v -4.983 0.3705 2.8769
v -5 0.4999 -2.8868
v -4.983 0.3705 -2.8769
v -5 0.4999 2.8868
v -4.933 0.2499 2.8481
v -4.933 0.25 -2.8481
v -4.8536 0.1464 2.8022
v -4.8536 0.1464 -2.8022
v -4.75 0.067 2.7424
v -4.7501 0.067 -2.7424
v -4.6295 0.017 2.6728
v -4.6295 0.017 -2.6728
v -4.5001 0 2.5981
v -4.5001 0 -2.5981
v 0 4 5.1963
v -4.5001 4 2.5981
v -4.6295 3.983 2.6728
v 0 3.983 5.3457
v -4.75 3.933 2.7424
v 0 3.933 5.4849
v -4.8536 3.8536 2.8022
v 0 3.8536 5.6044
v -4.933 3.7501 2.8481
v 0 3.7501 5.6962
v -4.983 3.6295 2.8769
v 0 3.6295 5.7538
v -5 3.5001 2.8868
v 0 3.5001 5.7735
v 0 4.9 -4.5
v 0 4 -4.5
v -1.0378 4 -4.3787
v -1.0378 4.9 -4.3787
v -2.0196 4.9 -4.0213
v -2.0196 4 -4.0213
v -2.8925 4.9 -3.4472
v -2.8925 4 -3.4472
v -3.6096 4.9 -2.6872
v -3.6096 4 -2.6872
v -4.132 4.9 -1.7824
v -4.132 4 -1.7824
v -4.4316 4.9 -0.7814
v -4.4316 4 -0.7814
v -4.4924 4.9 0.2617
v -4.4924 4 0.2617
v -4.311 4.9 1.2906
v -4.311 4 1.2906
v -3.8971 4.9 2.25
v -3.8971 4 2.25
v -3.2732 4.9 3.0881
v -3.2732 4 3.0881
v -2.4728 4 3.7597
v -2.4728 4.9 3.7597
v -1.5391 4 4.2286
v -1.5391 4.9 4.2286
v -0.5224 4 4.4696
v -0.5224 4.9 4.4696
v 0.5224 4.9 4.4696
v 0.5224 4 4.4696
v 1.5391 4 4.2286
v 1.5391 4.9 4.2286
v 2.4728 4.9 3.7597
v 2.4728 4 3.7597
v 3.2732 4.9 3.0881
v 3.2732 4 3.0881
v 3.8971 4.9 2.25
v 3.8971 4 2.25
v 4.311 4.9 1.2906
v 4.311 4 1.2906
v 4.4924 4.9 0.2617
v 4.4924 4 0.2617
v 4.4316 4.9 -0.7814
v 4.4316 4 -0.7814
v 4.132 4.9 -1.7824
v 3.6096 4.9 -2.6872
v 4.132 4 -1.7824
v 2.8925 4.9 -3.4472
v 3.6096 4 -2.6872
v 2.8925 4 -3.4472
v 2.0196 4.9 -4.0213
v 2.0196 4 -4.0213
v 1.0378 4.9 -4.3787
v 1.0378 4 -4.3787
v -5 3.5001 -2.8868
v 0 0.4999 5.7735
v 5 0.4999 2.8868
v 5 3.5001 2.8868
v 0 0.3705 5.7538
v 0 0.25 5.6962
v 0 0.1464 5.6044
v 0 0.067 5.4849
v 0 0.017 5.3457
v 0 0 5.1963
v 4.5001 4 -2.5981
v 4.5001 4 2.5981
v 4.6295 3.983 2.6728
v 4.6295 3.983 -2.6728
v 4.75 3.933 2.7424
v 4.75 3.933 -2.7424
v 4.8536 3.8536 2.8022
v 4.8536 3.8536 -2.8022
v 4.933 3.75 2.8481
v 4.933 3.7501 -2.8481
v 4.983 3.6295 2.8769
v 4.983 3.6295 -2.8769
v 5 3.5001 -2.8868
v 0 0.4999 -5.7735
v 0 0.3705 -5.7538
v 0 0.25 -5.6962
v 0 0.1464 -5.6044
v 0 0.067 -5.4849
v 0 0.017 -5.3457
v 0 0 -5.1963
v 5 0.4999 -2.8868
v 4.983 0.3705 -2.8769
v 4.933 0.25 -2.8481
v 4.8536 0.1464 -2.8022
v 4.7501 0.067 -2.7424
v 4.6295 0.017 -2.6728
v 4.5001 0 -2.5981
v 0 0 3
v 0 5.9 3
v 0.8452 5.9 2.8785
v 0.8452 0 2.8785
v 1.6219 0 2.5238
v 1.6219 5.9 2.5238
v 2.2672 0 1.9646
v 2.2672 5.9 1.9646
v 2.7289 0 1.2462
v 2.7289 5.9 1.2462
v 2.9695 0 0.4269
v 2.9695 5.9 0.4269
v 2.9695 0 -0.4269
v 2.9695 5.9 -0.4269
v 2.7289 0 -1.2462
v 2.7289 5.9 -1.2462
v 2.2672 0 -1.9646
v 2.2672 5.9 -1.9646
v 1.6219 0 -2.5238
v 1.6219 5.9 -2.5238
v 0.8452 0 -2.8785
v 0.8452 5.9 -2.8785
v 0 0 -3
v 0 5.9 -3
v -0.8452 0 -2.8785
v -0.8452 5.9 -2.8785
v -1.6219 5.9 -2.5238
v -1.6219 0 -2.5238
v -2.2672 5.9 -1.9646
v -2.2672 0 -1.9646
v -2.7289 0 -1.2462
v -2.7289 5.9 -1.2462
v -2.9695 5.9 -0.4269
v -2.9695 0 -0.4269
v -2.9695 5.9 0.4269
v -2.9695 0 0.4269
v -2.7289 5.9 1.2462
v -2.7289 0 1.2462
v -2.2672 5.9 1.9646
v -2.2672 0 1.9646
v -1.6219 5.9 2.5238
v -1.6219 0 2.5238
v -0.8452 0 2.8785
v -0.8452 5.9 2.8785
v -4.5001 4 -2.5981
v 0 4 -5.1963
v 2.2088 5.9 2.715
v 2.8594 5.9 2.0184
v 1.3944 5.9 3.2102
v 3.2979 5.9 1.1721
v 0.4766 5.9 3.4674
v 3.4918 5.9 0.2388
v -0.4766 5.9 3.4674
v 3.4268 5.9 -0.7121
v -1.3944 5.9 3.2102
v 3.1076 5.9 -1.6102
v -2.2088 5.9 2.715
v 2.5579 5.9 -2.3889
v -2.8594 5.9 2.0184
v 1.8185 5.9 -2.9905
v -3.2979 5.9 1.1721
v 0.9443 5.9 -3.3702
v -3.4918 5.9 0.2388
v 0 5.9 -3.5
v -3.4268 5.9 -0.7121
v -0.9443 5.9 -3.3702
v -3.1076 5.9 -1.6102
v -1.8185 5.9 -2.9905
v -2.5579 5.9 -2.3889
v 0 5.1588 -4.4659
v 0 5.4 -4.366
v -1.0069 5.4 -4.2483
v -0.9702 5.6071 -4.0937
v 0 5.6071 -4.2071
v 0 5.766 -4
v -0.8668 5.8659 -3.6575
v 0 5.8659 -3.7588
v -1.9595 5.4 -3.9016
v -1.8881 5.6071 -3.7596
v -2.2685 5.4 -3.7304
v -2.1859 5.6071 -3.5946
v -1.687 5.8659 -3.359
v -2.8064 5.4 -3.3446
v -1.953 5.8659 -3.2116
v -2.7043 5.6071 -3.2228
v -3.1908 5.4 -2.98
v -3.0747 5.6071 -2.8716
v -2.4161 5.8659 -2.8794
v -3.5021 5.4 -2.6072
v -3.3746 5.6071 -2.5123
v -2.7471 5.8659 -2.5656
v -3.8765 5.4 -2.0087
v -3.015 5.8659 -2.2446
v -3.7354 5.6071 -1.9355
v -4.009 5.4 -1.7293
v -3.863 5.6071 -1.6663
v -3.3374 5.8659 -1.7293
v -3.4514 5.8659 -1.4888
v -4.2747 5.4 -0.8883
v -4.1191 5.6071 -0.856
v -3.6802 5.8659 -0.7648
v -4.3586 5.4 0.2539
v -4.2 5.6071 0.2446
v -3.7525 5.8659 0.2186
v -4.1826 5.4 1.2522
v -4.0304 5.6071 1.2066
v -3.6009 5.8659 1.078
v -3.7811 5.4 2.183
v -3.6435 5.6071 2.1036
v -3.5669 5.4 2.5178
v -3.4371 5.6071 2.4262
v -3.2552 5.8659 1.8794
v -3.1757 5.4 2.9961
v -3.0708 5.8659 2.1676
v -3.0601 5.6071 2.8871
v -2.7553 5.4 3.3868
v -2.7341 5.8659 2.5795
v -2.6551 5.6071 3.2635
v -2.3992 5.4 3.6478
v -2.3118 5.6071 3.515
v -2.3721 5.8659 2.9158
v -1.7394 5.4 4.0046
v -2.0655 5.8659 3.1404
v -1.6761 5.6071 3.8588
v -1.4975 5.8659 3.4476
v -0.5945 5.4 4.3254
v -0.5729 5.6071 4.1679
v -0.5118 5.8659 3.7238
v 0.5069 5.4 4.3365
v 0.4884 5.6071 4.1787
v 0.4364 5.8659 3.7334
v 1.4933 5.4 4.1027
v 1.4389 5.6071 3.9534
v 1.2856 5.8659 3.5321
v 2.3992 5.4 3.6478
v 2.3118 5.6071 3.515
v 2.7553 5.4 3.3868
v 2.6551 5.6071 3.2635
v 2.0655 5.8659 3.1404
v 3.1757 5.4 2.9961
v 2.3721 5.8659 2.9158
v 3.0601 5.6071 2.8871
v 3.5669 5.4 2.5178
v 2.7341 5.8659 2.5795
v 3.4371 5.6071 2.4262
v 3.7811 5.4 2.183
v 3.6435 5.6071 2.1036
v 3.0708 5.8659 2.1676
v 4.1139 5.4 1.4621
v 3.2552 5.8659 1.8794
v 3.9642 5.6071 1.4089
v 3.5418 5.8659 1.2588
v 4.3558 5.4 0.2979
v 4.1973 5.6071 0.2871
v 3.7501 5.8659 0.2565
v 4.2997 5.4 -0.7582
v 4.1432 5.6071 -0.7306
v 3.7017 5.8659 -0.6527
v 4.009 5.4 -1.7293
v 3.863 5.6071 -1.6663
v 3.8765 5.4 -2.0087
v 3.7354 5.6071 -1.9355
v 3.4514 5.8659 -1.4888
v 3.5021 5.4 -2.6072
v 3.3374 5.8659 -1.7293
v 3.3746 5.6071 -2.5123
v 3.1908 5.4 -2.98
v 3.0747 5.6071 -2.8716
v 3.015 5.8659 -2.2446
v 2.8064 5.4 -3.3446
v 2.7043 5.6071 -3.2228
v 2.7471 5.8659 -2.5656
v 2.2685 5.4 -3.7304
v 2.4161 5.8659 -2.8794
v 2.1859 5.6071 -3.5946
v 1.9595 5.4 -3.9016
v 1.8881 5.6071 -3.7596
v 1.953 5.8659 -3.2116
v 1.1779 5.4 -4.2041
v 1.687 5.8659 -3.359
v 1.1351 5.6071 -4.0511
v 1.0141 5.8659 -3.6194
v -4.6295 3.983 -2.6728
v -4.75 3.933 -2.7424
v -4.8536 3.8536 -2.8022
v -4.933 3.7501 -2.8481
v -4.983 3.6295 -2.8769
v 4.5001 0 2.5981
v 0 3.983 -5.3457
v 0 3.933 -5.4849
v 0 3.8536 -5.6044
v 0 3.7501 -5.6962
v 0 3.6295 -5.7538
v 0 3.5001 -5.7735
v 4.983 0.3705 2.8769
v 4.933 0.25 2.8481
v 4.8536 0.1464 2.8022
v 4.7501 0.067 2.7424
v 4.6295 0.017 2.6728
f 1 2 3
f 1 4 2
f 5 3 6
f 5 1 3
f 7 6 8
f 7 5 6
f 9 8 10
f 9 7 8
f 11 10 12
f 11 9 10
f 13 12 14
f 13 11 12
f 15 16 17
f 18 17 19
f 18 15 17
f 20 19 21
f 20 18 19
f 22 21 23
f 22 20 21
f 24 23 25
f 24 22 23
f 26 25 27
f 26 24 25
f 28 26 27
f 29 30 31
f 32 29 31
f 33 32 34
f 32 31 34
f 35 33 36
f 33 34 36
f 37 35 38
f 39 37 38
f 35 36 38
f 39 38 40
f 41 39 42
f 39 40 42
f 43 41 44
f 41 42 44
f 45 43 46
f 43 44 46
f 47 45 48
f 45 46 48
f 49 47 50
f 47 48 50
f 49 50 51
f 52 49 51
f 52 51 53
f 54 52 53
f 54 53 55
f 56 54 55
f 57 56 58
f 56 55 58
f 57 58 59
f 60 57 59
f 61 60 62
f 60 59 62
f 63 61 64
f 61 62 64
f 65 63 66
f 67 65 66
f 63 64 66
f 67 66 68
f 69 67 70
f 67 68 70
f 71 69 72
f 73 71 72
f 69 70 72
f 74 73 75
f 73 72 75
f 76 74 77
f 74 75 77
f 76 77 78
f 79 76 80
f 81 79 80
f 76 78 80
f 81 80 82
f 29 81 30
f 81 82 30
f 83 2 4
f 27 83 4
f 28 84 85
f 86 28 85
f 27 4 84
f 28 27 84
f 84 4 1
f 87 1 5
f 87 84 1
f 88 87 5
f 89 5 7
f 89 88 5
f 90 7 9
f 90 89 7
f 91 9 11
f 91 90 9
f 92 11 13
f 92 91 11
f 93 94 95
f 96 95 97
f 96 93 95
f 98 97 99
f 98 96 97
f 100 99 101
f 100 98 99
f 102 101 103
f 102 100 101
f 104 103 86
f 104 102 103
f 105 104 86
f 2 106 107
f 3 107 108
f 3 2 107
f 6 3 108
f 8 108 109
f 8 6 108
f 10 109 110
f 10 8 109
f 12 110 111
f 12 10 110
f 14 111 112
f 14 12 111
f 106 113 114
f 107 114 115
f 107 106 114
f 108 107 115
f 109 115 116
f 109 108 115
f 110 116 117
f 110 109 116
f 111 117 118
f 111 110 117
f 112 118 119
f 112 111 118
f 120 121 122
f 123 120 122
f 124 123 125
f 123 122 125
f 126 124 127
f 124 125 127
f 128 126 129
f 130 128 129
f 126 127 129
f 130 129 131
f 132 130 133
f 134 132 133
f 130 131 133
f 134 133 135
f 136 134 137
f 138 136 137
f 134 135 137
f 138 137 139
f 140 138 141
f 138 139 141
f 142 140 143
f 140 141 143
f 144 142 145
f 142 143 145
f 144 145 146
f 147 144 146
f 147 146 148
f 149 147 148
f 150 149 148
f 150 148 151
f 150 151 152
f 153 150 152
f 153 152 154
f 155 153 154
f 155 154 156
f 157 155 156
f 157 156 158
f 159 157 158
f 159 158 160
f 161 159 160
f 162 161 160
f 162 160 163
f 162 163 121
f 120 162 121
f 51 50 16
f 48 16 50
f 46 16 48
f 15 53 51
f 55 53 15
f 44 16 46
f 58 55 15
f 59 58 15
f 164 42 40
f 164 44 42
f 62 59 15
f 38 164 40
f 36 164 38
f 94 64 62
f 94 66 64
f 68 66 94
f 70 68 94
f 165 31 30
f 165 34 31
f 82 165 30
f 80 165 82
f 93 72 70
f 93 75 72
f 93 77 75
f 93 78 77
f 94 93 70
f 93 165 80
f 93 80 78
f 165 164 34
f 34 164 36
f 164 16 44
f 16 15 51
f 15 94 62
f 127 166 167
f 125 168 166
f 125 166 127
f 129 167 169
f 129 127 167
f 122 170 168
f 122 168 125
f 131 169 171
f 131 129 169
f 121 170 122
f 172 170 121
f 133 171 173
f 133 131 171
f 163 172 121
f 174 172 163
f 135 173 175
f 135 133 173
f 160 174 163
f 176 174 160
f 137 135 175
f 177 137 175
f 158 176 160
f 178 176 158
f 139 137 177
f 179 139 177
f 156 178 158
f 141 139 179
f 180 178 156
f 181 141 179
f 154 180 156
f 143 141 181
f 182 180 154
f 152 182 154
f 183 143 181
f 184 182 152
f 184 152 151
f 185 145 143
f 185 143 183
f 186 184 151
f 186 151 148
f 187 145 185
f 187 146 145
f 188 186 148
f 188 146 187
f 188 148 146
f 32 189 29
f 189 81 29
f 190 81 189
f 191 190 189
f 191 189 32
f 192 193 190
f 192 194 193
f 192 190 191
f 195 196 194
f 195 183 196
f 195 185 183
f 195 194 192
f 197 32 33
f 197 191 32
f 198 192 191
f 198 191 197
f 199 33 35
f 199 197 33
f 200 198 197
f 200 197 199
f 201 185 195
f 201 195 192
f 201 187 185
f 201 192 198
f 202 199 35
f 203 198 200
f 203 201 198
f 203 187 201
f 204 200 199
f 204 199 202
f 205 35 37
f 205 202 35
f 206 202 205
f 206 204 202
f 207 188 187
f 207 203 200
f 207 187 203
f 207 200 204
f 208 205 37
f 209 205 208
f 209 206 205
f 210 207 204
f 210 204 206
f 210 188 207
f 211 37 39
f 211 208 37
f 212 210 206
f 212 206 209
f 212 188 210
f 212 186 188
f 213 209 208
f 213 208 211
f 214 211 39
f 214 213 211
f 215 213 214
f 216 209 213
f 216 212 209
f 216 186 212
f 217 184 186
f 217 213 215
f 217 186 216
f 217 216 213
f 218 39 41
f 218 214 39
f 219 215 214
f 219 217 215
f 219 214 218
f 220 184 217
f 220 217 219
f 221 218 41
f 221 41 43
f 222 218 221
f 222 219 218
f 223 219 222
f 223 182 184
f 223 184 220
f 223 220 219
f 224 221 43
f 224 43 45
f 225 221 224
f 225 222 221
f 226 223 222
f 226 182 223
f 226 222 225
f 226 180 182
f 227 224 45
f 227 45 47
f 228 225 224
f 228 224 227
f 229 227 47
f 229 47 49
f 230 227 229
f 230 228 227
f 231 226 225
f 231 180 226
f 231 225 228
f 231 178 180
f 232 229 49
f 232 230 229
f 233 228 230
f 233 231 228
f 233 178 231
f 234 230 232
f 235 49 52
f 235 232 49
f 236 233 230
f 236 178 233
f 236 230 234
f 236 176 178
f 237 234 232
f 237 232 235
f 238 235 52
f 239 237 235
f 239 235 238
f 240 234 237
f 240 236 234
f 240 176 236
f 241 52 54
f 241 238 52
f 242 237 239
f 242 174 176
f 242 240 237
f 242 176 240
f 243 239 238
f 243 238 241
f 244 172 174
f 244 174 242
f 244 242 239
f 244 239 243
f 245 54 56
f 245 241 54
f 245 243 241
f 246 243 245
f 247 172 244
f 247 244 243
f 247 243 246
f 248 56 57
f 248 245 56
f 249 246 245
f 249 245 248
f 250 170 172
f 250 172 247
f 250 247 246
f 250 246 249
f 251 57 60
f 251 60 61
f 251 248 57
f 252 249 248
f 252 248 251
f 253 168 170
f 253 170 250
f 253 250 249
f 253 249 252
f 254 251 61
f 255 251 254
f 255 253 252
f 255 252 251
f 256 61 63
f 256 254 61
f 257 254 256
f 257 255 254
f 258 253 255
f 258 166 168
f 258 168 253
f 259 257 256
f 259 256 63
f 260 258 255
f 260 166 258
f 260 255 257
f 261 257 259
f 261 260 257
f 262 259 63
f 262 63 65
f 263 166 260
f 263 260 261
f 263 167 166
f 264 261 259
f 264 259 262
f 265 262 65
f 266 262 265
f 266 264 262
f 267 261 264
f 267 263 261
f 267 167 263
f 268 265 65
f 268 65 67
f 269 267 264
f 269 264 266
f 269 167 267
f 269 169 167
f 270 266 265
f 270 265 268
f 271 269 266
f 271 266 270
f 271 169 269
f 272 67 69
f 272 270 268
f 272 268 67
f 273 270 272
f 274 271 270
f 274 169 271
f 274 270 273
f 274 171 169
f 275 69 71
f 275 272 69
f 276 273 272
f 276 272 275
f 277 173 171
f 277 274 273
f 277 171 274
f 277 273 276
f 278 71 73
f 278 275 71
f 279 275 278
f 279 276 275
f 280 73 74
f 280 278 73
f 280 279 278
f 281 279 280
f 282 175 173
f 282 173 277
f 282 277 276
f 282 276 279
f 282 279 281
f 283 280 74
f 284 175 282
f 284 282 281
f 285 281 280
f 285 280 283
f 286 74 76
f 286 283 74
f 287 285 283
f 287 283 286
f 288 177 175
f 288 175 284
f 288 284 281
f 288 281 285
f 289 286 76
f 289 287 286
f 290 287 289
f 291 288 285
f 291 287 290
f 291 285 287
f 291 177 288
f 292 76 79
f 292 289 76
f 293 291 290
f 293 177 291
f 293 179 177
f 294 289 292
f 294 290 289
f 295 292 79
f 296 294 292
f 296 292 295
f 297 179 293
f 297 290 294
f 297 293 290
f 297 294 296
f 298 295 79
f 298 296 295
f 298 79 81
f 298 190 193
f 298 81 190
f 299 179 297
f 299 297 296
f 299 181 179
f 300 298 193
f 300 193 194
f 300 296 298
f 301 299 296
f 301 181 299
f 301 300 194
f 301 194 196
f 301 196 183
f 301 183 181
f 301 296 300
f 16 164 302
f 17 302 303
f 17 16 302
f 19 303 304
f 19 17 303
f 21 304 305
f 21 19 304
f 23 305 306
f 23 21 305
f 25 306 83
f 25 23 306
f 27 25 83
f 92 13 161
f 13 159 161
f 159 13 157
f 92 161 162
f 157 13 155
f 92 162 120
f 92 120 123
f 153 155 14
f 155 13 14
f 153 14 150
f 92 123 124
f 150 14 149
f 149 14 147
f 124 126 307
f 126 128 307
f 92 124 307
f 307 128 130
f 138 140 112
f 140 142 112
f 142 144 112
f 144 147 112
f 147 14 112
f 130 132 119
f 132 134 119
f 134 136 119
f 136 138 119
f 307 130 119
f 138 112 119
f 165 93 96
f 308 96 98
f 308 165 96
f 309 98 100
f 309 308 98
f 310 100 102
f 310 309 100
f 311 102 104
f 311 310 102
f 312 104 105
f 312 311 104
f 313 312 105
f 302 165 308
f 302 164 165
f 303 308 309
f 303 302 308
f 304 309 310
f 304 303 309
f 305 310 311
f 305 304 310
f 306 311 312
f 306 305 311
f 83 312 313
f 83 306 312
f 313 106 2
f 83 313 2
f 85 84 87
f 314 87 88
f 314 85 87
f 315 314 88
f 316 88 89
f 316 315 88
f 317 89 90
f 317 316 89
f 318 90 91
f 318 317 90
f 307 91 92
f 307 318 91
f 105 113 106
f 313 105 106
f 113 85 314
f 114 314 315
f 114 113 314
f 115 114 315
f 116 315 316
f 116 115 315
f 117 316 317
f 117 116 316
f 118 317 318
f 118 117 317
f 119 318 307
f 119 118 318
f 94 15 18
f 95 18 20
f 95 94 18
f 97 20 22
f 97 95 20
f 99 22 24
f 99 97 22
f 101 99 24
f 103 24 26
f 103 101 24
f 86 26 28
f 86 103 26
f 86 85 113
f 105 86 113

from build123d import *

# Parameters (mm, degrees)
EXTRUDE_1_DEPTH     = 4
SKETCH_2_R          = 4.5
EXTRUDE_2_DEPTH     = 1.9
SKETCH_3_R          = 3
CUT_EXTRUDE_1_DEPTH = 20
FILLET_1_R          = 1
FILLET_3_R          = 0.5


with BuildPart() as part:
    # 草图1 → 凸台-拉伸1 (new body)
    with BuildSketch(Plane(origin=(0, 0, 0), x_dir=(1, 0, 0), z_dir=(0, 1, 0))):
        Polygon((0, -5.773502692), (5, -2.886751346), (5, 2.886751346), (0, 5.773502692), (-5, 2.886751346), (-5, -2.886751346), align=None)
    extrude(amount=EXTRUDE_1_DEPTH)

    # 草图2 → 凸台-拉伸2 (add)
    with BuildSketch(Plane(origin=(0, 4, 0), x_dir=(1, 0, 0), z_dir=(0, 1, 0))):
        with Locations(Location((0, 0, 0), (0, 0, 90))):
            Circle(SKETCH_2_R)
    extrude(amount=EXTRUDE_2_DEPTH)

    # 草图3 → 切除-拉伸1 (cut)
    with BuildSketch(Plane(origin=(0, 5.9, 0), x_dir=(1, 0, 0), z_dir=(0, 1, 0))):
        with Locations(Location((0, 0, 0), (0, 0, 270))):
            Circle(SKETCH_3_R)
    extrude(amount=-CUT_EXTRUDE_1_DEPTH, mode=Mode.SUBTRACT)

    # 圆角1
    fillet_1_edges = [part.edges().sort_by_distance(p)[0] for p in [
        (0, 5.9, 4.5),
    ]]
    fillet(fillet_1_edges, radius=FILLET_1_R)

    # 圆角3
    fillet_3_edges = [part.edges().sort_by_distance(p)[0] for p in [
        (5, 4, 0),
        (2.5, 4, -4.330127019),
        (-2.5, 4, -4.330127019),
        (-5, 4, 0),
        (-2.5, 4, 4.330127019),
        (-5, 0, 0),
        (-2.5, 0, -4.330127019),
        (2.5, 0, -4.330127019),
        (5, 0, 0),
        (2.5, 0, 4.330127019),
        (-2.5, 0, 4.330127019),
        (2.5, 4, 4.330127019),
    ]]
    fillet(fillet_3_edges, radius=FILLET_3_R - 0.0001)  # a hair under: the kernel refuses the full size


solid = part.part
